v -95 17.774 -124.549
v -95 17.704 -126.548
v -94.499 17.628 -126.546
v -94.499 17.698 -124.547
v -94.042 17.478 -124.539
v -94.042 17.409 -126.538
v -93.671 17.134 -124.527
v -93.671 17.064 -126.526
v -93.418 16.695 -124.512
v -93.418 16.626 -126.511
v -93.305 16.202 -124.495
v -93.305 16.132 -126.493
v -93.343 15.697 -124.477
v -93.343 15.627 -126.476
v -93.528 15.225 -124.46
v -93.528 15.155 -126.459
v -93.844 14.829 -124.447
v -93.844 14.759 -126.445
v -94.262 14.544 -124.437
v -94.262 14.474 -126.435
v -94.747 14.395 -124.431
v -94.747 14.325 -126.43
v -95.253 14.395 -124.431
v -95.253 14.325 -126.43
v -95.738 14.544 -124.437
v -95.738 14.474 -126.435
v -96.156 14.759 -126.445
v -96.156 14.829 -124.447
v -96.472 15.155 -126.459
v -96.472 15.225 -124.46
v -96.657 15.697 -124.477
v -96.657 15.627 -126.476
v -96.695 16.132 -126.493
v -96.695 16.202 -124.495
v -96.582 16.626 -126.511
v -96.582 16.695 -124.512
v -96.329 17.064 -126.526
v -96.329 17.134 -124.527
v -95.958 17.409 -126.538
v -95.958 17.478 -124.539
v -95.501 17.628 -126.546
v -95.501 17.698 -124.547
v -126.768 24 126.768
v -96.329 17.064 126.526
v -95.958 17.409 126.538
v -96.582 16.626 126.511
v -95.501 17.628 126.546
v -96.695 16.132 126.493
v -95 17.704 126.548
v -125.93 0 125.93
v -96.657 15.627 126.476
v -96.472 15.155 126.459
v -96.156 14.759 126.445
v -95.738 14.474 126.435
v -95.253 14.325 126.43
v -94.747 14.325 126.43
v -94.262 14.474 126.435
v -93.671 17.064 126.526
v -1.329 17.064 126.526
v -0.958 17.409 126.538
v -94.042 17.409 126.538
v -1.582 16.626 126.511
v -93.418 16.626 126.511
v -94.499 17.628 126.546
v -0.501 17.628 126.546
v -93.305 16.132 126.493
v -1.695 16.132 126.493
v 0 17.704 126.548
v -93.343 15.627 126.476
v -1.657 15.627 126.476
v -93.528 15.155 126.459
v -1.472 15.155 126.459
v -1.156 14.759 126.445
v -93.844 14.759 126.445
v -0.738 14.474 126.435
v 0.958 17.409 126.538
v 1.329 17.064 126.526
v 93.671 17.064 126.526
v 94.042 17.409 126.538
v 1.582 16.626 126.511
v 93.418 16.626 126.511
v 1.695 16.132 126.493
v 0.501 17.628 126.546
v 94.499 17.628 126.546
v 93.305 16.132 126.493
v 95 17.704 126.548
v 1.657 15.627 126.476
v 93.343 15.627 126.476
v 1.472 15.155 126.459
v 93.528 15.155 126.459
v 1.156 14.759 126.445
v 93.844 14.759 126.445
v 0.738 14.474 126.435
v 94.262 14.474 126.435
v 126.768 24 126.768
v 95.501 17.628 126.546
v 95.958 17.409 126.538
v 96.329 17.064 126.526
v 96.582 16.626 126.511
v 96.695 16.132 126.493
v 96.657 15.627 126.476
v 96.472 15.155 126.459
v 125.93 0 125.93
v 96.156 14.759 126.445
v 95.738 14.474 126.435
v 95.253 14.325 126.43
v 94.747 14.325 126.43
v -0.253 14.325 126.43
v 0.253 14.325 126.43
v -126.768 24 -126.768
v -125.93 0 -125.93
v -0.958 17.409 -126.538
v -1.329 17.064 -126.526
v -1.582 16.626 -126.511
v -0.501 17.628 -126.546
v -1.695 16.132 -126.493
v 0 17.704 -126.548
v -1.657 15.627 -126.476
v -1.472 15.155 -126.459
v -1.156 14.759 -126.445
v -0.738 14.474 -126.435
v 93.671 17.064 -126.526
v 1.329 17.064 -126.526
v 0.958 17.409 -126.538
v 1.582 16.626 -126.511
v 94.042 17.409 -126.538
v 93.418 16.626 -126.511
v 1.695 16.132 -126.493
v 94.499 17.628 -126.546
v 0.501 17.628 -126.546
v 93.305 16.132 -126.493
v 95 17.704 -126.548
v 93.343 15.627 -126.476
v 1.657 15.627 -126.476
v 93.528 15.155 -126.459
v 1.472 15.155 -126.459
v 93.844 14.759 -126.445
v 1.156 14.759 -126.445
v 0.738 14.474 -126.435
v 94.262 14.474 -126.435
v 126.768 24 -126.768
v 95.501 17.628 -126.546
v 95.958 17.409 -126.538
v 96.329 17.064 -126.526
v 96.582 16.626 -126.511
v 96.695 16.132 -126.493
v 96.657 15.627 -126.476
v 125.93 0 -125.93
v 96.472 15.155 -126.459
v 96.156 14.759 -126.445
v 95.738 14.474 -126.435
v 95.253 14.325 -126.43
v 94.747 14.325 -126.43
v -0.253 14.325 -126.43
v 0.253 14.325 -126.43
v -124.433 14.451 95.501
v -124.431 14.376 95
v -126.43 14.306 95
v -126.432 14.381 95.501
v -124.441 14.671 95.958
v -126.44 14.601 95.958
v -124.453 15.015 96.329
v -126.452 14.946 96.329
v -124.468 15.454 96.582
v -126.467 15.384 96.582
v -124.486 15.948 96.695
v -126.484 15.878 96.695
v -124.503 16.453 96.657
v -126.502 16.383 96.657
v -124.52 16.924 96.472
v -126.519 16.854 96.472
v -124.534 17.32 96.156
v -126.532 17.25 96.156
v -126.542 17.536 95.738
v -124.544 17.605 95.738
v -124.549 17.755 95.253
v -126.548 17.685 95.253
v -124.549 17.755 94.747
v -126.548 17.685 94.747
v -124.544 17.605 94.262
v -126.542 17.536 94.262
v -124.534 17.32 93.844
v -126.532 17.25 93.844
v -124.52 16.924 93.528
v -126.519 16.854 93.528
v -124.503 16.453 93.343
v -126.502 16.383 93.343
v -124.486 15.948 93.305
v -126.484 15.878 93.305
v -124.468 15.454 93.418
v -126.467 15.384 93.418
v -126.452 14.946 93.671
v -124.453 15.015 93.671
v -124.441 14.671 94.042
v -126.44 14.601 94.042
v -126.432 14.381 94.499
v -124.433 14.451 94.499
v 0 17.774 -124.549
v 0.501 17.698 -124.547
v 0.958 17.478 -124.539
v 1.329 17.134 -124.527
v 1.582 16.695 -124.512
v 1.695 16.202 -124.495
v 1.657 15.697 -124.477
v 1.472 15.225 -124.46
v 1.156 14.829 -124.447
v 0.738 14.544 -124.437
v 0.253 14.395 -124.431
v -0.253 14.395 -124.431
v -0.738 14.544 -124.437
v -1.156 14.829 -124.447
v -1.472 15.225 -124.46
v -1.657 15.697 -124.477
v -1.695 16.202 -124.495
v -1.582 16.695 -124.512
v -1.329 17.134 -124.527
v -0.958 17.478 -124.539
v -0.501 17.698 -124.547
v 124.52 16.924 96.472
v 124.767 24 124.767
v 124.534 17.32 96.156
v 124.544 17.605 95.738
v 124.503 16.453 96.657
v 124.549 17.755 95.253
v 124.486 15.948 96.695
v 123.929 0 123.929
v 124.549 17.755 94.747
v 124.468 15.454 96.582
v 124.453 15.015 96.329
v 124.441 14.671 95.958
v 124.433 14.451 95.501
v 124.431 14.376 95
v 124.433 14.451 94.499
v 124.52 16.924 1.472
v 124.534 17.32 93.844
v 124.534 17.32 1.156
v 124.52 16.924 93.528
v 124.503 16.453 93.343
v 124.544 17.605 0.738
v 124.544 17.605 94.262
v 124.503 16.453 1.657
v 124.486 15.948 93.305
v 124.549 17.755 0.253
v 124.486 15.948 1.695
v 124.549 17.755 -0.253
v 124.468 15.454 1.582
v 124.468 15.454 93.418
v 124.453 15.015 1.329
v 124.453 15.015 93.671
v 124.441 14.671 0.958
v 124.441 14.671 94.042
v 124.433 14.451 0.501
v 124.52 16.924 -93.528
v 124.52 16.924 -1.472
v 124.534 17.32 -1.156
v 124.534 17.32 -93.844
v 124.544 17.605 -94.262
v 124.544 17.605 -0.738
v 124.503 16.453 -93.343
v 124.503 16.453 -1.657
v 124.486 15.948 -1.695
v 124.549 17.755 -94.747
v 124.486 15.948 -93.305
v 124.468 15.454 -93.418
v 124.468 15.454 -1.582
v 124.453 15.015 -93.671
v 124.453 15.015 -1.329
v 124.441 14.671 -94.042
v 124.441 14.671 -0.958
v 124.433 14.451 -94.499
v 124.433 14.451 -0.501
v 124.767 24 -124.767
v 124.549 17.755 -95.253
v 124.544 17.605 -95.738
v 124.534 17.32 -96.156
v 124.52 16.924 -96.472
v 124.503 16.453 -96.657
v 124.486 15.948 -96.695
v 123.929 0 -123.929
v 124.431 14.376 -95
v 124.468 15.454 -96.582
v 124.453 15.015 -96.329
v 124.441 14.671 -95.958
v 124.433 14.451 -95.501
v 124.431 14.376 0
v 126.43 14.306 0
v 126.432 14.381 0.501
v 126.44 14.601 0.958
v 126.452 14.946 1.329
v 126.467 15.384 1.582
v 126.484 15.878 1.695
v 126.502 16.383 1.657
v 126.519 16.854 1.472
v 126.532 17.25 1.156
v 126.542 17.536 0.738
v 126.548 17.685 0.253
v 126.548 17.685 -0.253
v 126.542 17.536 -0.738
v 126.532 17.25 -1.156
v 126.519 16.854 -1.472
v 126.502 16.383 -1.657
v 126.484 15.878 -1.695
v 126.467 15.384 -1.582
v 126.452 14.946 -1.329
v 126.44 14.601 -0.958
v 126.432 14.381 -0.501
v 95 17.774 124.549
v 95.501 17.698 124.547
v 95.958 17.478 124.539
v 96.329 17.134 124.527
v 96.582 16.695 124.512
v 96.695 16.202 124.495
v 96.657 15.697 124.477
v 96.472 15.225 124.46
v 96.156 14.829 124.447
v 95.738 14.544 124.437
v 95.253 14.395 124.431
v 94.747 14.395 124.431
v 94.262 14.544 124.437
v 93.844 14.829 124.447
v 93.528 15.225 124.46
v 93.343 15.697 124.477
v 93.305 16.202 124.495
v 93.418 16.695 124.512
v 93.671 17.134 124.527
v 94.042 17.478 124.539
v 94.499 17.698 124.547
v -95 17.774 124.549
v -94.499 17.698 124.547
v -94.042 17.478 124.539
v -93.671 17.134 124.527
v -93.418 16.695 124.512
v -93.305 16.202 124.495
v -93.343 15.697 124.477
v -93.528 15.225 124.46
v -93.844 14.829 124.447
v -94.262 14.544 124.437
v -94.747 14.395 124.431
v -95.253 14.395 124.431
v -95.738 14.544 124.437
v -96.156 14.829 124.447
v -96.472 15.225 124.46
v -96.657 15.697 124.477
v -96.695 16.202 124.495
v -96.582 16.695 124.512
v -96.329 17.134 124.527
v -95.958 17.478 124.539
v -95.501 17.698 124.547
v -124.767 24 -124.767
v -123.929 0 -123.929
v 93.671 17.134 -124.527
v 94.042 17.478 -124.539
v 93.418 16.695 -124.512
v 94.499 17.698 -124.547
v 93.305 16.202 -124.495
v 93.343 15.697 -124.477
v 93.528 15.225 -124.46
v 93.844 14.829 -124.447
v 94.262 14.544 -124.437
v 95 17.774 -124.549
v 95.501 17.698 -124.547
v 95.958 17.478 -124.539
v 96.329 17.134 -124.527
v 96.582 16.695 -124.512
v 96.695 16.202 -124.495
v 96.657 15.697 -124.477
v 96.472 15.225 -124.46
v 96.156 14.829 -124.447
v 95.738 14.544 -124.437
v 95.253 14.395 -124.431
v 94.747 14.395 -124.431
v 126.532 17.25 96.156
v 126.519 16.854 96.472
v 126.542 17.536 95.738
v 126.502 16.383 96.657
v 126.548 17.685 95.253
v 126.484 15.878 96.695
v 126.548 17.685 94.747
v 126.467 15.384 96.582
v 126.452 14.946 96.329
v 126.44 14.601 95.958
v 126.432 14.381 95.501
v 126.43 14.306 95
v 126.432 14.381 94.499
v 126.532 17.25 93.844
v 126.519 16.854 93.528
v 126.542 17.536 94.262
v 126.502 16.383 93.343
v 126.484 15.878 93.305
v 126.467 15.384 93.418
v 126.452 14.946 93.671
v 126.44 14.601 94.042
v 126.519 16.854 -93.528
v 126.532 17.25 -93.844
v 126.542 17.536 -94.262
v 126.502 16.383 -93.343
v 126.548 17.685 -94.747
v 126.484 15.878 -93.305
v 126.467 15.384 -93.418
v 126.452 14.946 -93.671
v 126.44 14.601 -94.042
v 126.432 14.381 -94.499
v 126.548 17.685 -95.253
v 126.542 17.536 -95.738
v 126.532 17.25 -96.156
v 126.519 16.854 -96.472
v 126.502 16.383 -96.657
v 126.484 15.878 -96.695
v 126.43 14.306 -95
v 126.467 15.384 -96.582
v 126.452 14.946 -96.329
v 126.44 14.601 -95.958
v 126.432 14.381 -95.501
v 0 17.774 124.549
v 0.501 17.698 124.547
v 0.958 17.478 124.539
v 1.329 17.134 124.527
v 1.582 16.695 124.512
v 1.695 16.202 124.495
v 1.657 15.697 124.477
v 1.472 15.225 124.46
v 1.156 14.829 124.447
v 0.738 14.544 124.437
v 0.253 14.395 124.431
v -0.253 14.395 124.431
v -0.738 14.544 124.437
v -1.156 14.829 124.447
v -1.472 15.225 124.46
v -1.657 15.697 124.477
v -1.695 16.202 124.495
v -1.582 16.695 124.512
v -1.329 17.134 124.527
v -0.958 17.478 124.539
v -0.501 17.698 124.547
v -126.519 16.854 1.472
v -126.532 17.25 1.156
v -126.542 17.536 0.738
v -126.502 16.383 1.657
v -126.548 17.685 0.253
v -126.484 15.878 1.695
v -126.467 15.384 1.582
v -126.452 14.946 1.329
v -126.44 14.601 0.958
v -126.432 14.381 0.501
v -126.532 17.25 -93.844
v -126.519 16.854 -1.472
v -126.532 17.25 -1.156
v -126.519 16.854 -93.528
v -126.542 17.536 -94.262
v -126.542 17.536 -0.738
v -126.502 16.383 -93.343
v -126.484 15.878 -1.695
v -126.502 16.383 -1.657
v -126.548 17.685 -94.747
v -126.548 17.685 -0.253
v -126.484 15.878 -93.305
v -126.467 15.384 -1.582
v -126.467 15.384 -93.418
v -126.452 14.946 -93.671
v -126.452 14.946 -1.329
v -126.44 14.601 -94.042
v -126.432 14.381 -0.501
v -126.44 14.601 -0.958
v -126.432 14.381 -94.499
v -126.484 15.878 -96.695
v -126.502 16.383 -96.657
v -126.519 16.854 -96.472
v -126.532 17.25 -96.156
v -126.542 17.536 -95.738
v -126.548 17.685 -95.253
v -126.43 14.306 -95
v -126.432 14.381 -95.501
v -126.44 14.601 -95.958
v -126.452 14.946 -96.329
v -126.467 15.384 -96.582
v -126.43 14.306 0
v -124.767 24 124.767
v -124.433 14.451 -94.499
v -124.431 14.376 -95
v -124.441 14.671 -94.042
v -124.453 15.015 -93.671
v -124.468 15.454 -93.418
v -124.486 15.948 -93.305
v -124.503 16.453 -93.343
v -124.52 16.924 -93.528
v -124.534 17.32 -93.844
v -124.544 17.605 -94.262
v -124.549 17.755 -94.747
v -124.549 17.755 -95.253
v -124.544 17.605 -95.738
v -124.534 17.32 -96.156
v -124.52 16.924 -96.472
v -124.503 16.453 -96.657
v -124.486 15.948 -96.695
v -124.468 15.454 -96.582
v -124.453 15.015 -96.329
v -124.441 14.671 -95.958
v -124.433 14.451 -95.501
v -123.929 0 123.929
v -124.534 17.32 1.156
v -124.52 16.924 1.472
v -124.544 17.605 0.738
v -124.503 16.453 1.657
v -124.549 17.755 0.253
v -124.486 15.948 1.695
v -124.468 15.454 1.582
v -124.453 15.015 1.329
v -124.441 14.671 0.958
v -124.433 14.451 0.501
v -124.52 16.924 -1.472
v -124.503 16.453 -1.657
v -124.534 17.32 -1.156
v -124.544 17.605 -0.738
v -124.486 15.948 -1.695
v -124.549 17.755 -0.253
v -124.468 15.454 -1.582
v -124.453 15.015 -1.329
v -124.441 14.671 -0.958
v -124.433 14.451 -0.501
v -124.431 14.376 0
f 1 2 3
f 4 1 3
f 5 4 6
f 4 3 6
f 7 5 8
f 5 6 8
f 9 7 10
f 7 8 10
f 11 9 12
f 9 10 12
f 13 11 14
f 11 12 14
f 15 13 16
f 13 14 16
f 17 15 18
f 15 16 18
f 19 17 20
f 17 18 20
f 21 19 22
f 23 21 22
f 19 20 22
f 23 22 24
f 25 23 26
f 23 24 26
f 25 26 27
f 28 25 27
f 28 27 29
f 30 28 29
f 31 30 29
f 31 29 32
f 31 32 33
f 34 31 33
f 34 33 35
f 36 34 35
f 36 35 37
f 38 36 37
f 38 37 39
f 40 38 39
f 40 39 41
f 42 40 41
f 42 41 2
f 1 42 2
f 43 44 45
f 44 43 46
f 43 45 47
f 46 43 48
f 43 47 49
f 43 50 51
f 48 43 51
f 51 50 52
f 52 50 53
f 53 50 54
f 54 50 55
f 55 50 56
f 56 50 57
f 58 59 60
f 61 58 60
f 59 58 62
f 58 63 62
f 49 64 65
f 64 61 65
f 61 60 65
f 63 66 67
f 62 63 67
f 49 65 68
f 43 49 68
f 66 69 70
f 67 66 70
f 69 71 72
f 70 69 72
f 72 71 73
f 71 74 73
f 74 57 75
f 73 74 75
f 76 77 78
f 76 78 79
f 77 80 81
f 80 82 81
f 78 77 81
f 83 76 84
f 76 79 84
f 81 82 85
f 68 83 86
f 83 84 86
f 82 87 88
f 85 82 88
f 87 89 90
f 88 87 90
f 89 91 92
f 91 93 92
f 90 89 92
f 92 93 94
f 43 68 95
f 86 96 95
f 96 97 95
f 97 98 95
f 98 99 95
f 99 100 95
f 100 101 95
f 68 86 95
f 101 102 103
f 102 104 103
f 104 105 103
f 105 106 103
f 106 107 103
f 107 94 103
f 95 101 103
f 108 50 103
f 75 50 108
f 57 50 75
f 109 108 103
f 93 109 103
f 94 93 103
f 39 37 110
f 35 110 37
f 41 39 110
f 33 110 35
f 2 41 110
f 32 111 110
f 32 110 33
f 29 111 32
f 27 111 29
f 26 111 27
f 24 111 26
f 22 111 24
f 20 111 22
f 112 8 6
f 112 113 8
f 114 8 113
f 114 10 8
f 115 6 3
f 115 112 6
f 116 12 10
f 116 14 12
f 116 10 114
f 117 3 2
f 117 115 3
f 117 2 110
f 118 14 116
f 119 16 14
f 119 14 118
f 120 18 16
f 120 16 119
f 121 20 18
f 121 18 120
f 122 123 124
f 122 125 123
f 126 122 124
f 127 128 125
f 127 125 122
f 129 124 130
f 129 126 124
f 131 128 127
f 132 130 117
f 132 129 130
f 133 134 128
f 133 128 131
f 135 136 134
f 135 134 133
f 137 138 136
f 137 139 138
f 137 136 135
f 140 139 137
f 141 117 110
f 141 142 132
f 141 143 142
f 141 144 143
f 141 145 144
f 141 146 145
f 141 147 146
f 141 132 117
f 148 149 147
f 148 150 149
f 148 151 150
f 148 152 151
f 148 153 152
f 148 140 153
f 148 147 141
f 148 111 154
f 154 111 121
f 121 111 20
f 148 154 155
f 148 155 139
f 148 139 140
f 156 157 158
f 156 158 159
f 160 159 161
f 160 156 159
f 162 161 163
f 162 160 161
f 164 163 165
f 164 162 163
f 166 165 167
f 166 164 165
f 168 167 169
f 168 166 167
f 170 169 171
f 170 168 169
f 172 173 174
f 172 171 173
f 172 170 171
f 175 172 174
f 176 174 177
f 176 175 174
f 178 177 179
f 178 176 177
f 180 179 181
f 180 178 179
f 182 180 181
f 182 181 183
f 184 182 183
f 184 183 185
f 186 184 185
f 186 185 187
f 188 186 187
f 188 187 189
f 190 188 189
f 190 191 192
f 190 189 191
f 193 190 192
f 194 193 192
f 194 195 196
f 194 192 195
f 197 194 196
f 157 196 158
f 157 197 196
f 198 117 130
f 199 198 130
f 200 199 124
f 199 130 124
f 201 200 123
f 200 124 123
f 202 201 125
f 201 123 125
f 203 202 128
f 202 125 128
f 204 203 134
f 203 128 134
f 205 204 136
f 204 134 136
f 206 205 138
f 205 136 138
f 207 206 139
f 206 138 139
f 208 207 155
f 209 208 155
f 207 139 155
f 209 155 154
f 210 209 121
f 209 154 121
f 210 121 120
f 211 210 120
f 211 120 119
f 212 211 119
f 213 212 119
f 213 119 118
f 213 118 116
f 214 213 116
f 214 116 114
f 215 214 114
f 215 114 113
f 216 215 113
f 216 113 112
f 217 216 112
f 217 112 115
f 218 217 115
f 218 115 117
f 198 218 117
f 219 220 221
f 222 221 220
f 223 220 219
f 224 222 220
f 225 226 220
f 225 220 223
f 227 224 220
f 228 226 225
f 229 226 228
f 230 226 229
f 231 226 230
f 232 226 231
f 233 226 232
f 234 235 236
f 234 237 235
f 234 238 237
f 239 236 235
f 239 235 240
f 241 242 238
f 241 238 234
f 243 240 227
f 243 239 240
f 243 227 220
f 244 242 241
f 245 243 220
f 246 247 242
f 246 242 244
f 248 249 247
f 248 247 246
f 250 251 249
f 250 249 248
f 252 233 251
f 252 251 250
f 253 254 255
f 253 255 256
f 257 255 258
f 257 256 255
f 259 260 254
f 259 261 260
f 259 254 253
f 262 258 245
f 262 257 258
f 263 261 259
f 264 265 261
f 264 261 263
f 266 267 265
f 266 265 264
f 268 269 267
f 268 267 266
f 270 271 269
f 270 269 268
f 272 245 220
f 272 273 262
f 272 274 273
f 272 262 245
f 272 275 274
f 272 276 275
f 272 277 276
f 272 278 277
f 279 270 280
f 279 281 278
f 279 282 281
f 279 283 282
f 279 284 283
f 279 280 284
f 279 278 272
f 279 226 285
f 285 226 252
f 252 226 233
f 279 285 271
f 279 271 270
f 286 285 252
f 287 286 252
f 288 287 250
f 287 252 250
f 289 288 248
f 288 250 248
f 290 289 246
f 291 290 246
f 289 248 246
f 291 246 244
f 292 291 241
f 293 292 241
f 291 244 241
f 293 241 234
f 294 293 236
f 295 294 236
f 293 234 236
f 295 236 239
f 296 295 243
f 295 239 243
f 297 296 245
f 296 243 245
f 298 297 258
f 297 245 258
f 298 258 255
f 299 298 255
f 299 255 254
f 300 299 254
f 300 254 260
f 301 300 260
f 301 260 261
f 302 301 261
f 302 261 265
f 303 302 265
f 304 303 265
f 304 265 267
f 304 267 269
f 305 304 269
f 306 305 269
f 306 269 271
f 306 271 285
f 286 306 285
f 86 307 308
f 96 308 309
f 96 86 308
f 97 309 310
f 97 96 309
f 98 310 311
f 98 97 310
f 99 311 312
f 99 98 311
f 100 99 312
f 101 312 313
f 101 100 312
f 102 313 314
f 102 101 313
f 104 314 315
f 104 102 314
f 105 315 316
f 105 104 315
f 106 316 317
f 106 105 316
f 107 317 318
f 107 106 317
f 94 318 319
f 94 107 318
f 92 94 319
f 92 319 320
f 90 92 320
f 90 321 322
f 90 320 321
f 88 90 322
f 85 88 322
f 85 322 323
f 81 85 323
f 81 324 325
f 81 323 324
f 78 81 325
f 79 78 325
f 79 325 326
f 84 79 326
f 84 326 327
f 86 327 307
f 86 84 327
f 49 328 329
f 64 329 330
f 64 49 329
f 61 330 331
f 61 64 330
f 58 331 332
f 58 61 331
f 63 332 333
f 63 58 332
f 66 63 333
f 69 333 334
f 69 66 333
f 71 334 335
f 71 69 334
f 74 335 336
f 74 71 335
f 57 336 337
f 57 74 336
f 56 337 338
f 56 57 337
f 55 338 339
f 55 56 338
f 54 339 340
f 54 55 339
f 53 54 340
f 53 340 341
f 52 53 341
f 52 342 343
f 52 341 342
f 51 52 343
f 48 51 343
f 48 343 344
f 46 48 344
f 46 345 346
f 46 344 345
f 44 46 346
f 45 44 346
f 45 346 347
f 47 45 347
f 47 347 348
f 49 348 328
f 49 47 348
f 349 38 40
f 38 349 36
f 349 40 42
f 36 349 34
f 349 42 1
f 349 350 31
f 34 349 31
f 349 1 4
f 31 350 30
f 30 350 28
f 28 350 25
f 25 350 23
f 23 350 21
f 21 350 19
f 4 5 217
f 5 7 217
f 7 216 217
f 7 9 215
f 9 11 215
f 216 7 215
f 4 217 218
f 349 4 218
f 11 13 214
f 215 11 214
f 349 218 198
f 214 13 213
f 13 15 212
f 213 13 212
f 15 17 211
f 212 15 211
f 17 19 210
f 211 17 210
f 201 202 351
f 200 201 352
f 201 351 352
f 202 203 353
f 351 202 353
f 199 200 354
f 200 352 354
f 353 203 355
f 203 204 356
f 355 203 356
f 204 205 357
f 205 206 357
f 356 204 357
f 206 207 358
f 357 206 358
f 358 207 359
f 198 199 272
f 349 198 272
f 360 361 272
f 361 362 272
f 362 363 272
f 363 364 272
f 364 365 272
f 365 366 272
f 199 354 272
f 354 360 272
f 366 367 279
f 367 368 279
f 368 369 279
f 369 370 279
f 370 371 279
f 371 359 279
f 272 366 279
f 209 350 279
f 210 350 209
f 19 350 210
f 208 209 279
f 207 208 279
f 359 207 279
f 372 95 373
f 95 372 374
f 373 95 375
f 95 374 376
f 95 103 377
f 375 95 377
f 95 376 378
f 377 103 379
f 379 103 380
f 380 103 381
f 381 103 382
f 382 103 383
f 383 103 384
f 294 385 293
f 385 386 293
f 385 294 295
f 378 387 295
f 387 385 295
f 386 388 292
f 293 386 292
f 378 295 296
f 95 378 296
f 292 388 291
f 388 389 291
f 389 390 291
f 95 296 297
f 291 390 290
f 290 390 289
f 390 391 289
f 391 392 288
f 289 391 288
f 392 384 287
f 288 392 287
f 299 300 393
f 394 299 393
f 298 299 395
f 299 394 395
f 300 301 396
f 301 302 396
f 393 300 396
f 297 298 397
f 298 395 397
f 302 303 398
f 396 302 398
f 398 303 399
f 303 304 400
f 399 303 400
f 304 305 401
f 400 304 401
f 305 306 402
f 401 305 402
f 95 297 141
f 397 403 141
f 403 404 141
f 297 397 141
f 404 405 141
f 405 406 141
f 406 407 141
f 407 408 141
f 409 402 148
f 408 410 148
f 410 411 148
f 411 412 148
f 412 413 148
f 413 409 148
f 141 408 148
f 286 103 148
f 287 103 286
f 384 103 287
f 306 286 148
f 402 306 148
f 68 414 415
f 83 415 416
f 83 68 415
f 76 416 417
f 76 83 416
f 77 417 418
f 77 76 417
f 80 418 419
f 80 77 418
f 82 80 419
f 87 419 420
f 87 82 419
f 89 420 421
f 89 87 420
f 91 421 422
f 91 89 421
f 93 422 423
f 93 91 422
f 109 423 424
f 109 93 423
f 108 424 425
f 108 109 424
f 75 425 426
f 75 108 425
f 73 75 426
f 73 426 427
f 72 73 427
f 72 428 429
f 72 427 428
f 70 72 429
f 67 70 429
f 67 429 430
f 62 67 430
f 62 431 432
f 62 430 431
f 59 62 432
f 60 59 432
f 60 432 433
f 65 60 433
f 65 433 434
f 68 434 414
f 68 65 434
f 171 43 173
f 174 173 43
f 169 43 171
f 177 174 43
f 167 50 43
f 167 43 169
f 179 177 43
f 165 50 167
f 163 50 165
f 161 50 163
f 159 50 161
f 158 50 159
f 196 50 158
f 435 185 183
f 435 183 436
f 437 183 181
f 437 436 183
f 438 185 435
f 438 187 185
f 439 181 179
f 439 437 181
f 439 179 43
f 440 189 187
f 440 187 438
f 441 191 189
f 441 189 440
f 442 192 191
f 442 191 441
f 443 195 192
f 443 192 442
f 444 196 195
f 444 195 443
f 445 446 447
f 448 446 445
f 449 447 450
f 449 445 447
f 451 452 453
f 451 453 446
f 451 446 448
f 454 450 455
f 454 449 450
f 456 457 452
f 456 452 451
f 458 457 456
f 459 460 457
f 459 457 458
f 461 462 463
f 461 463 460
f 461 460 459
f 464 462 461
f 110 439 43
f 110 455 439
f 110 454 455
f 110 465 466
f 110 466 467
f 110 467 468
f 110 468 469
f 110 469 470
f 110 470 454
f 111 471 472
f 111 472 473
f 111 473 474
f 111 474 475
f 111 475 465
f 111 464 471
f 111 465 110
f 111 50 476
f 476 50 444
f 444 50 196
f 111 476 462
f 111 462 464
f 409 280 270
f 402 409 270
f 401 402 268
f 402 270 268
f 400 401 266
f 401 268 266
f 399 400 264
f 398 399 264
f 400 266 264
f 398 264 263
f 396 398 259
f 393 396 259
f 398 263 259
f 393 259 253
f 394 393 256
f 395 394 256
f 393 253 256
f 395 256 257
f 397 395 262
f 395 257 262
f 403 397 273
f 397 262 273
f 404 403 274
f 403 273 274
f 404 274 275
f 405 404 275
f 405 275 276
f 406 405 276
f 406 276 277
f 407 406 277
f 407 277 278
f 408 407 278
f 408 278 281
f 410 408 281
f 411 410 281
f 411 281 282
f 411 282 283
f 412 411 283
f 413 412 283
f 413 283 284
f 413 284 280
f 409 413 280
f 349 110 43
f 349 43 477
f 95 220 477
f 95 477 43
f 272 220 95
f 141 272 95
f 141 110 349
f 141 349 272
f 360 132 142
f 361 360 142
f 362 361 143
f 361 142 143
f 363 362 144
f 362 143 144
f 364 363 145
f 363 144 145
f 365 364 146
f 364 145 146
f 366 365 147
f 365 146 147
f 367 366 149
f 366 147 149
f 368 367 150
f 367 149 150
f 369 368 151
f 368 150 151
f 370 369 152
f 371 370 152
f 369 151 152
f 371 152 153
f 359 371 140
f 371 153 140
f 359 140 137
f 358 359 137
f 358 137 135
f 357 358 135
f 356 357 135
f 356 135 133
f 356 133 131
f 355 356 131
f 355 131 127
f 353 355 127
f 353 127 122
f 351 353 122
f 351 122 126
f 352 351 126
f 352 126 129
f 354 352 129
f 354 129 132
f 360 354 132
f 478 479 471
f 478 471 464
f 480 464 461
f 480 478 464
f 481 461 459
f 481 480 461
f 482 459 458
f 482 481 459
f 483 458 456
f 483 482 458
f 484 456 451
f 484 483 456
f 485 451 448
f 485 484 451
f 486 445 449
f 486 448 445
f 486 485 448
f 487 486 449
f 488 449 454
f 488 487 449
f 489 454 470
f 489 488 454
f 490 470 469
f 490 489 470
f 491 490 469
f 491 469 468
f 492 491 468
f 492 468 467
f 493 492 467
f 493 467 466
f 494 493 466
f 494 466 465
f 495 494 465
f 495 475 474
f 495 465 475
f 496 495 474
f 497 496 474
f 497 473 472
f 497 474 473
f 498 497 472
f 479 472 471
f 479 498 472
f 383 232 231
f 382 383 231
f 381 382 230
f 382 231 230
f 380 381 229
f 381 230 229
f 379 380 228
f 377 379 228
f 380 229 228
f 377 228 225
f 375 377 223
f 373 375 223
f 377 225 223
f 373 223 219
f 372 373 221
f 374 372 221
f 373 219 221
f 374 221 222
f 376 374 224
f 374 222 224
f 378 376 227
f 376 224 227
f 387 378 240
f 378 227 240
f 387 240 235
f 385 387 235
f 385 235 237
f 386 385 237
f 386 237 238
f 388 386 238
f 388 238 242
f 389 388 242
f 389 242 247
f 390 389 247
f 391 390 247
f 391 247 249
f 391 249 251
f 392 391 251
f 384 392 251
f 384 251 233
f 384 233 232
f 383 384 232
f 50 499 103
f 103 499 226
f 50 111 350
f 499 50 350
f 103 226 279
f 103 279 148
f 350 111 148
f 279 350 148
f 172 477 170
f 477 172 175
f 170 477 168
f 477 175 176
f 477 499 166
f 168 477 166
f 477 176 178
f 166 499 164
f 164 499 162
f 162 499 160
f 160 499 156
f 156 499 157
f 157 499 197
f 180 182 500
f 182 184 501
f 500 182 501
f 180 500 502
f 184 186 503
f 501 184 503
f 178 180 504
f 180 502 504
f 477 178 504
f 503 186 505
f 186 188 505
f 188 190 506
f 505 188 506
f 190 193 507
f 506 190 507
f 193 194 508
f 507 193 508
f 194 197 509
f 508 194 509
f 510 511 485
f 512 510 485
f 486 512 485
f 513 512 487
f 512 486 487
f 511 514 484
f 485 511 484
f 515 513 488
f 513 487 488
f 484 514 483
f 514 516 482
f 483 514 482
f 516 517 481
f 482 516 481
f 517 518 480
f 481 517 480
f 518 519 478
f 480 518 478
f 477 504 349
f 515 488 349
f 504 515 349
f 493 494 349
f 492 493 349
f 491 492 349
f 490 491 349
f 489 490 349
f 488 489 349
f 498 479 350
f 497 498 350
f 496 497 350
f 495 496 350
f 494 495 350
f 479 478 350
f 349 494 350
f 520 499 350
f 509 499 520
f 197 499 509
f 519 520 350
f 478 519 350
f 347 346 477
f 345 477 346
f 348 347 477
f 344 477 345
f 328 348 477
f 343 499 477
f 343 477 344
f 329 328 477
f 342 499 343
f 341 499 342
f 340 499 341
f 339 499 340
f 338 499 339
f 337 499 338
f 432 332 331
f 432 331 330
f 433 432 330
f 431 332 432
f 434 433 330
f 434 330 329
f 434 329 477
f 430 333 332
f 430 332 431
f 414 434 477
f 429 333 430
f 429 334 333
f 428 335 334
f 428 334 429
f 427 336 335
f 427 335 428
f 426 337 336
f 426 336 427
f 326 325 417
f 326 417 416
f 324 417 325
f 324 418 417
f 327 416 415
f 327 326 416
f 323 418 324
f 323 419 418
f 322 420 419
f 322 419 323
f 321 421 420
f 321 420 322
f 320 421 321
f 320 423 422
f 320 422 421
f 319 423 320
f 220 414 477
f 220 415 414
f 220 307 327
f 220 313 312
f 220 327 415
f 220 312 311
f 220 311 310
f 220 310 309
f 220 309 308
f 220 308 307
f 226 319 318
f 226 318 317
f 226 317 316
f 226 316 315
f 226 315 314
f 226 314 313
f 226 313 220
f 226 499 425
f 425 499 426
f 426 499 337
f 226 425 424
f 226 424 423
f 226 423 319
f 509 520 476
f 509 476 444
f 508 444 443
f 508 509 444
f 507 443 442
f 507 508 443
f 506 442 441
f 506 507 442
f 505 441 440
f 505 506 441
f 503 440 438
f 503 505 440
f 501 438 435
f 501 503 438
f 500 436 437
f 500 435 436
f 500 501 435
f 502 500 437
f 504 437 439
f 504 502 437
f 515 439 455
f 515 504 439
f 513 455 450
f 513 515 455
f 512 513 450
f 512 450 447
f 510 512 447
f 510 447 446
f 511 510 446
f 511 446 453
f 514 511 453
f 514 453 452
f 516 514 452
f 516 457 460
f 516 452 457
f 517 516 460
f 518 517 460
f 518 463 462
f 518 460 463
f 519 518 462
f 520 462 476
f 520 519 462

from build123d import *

# Parameters (mm, degrees)
SKETCH2_W           = 251.86
SKETCH2_H           = 251.86
BOSS_EXTRUDE1_DEPTH = 24
BOSS_EXTRUDE1_DRAFT = -2
SHELL1_T            = -2
CUT_EXTRUDE1_START  = -10
SKETCH3_R           = 1.7
CUT_EXTRUDE1_DEPTH  = 294.998422143
SKETCH4_R           = 1.7
CUT_EXTRUDE2_DEPTH  = 10


with BuildPart() as part:
    # Sketch2 → Boss-Extrude1 (with draft: the straight prism first)
    with BuildSketch(Plane(origin=(0, 0, 0), x_dir=(1, 0, 0), z_dir=(0, 1, 0))):
        Rectangle(SKETCH2_W, SKETCH2_H)
    extrude(amount=BOSS_EXTRUDE1_DEPTH)
    # Boss-Extrude1: the draft: its side faces are tilted about the plane it starts from
    boss_extrude1_sides = [part.faces().sort_by_distance(p)[0] for p in [
        (0, 12, 125.93),
        (125.93, 12, 0),
        (0, 12, -125.93),
        (-125.93, 12, 0),
    ]]
    draft(boss_extrude1_sides, Plane(origin=(0, 0, 0), x_dir=(1, 0, 0), z_dir=(0, 1, 0)), BOSS_EXTRUDE1_DRAFT)

    # Shell1
    shell1_openings = [part.faces().sort_by_distance(p)[0] for p in [
        (0, 24, 0),
        (0, 0, 0),
    ]]
    offset(amount=SHELL1_T, openings=shell1_openings, kind=Kind.INTERSECTION)

    # Sketch3 → Cut-Extrude1 (cut)
    with BuildSketch(Plane(origin=(-125.776620425, -4.392216369, 0), x_dir=(0, 0, 1), z_dir=(-0.9993908270190958, -0.03489949670250105, 0)).offset(CUT_EXTRUDE1_START)):
        with Locations(Location((-95, 20.409522683, 0), (0, 0, 270))):
            Circle(SKETCH3_R)
        with Locations(Location((0, 20.409522683, 0), (0, 0, 270))):
            Circle(SKETCH3_R)
        with Locations(Location((95, 20.409522683, 0), (0, 0, 270))):
            Circle(SKETCH3_R)
    cut_extrude1 = extrude(amount=CUT_EXTRUDE1_DEPTH, mode=Mode.SUBTRACT)

    # Mirror1: Cut-Extrude1 across plane
    add(cut_extrude1.mirror(Plane(origin=(0, 0, 0), x_dir=(0, 0, 1), z_dir=(1, 0, 0))), mode=Mode.SUBTRACT)

    # Sketch4 → Cut-Extrude2 (cut)
    with BuildSketch(Plane(origin=(0, -4.392216369, -125.776620425), x_dir=(-1, 0, 0), z_dir=(0, -0.03489949670250105, -0.9993908270190958))):
        with Locations(Location((-95, 20.409522683, 0), (0, 0, 90))):
            Circle(SKETCH4_R)
        with Locations(Location((0, 20.409522683, 0), (0, 0, 90))):
            Circle(SKETCH4_R)
        with Locations(Location((95, 20.409522683, 0), (0, 0, 90))):
            Circle(SKETCH4_R)
    cut_extrude2 = extrude(amount=-CUT_EXTRUDE2_DEPTH, mode=Mode.SUBTRACT)

    # Mirror2: Cut-Extrude2 across plane
    add(cut_extrude2.mirror(Plane.XY), mode=Mode.SUBTRACT)


solid = part.part
